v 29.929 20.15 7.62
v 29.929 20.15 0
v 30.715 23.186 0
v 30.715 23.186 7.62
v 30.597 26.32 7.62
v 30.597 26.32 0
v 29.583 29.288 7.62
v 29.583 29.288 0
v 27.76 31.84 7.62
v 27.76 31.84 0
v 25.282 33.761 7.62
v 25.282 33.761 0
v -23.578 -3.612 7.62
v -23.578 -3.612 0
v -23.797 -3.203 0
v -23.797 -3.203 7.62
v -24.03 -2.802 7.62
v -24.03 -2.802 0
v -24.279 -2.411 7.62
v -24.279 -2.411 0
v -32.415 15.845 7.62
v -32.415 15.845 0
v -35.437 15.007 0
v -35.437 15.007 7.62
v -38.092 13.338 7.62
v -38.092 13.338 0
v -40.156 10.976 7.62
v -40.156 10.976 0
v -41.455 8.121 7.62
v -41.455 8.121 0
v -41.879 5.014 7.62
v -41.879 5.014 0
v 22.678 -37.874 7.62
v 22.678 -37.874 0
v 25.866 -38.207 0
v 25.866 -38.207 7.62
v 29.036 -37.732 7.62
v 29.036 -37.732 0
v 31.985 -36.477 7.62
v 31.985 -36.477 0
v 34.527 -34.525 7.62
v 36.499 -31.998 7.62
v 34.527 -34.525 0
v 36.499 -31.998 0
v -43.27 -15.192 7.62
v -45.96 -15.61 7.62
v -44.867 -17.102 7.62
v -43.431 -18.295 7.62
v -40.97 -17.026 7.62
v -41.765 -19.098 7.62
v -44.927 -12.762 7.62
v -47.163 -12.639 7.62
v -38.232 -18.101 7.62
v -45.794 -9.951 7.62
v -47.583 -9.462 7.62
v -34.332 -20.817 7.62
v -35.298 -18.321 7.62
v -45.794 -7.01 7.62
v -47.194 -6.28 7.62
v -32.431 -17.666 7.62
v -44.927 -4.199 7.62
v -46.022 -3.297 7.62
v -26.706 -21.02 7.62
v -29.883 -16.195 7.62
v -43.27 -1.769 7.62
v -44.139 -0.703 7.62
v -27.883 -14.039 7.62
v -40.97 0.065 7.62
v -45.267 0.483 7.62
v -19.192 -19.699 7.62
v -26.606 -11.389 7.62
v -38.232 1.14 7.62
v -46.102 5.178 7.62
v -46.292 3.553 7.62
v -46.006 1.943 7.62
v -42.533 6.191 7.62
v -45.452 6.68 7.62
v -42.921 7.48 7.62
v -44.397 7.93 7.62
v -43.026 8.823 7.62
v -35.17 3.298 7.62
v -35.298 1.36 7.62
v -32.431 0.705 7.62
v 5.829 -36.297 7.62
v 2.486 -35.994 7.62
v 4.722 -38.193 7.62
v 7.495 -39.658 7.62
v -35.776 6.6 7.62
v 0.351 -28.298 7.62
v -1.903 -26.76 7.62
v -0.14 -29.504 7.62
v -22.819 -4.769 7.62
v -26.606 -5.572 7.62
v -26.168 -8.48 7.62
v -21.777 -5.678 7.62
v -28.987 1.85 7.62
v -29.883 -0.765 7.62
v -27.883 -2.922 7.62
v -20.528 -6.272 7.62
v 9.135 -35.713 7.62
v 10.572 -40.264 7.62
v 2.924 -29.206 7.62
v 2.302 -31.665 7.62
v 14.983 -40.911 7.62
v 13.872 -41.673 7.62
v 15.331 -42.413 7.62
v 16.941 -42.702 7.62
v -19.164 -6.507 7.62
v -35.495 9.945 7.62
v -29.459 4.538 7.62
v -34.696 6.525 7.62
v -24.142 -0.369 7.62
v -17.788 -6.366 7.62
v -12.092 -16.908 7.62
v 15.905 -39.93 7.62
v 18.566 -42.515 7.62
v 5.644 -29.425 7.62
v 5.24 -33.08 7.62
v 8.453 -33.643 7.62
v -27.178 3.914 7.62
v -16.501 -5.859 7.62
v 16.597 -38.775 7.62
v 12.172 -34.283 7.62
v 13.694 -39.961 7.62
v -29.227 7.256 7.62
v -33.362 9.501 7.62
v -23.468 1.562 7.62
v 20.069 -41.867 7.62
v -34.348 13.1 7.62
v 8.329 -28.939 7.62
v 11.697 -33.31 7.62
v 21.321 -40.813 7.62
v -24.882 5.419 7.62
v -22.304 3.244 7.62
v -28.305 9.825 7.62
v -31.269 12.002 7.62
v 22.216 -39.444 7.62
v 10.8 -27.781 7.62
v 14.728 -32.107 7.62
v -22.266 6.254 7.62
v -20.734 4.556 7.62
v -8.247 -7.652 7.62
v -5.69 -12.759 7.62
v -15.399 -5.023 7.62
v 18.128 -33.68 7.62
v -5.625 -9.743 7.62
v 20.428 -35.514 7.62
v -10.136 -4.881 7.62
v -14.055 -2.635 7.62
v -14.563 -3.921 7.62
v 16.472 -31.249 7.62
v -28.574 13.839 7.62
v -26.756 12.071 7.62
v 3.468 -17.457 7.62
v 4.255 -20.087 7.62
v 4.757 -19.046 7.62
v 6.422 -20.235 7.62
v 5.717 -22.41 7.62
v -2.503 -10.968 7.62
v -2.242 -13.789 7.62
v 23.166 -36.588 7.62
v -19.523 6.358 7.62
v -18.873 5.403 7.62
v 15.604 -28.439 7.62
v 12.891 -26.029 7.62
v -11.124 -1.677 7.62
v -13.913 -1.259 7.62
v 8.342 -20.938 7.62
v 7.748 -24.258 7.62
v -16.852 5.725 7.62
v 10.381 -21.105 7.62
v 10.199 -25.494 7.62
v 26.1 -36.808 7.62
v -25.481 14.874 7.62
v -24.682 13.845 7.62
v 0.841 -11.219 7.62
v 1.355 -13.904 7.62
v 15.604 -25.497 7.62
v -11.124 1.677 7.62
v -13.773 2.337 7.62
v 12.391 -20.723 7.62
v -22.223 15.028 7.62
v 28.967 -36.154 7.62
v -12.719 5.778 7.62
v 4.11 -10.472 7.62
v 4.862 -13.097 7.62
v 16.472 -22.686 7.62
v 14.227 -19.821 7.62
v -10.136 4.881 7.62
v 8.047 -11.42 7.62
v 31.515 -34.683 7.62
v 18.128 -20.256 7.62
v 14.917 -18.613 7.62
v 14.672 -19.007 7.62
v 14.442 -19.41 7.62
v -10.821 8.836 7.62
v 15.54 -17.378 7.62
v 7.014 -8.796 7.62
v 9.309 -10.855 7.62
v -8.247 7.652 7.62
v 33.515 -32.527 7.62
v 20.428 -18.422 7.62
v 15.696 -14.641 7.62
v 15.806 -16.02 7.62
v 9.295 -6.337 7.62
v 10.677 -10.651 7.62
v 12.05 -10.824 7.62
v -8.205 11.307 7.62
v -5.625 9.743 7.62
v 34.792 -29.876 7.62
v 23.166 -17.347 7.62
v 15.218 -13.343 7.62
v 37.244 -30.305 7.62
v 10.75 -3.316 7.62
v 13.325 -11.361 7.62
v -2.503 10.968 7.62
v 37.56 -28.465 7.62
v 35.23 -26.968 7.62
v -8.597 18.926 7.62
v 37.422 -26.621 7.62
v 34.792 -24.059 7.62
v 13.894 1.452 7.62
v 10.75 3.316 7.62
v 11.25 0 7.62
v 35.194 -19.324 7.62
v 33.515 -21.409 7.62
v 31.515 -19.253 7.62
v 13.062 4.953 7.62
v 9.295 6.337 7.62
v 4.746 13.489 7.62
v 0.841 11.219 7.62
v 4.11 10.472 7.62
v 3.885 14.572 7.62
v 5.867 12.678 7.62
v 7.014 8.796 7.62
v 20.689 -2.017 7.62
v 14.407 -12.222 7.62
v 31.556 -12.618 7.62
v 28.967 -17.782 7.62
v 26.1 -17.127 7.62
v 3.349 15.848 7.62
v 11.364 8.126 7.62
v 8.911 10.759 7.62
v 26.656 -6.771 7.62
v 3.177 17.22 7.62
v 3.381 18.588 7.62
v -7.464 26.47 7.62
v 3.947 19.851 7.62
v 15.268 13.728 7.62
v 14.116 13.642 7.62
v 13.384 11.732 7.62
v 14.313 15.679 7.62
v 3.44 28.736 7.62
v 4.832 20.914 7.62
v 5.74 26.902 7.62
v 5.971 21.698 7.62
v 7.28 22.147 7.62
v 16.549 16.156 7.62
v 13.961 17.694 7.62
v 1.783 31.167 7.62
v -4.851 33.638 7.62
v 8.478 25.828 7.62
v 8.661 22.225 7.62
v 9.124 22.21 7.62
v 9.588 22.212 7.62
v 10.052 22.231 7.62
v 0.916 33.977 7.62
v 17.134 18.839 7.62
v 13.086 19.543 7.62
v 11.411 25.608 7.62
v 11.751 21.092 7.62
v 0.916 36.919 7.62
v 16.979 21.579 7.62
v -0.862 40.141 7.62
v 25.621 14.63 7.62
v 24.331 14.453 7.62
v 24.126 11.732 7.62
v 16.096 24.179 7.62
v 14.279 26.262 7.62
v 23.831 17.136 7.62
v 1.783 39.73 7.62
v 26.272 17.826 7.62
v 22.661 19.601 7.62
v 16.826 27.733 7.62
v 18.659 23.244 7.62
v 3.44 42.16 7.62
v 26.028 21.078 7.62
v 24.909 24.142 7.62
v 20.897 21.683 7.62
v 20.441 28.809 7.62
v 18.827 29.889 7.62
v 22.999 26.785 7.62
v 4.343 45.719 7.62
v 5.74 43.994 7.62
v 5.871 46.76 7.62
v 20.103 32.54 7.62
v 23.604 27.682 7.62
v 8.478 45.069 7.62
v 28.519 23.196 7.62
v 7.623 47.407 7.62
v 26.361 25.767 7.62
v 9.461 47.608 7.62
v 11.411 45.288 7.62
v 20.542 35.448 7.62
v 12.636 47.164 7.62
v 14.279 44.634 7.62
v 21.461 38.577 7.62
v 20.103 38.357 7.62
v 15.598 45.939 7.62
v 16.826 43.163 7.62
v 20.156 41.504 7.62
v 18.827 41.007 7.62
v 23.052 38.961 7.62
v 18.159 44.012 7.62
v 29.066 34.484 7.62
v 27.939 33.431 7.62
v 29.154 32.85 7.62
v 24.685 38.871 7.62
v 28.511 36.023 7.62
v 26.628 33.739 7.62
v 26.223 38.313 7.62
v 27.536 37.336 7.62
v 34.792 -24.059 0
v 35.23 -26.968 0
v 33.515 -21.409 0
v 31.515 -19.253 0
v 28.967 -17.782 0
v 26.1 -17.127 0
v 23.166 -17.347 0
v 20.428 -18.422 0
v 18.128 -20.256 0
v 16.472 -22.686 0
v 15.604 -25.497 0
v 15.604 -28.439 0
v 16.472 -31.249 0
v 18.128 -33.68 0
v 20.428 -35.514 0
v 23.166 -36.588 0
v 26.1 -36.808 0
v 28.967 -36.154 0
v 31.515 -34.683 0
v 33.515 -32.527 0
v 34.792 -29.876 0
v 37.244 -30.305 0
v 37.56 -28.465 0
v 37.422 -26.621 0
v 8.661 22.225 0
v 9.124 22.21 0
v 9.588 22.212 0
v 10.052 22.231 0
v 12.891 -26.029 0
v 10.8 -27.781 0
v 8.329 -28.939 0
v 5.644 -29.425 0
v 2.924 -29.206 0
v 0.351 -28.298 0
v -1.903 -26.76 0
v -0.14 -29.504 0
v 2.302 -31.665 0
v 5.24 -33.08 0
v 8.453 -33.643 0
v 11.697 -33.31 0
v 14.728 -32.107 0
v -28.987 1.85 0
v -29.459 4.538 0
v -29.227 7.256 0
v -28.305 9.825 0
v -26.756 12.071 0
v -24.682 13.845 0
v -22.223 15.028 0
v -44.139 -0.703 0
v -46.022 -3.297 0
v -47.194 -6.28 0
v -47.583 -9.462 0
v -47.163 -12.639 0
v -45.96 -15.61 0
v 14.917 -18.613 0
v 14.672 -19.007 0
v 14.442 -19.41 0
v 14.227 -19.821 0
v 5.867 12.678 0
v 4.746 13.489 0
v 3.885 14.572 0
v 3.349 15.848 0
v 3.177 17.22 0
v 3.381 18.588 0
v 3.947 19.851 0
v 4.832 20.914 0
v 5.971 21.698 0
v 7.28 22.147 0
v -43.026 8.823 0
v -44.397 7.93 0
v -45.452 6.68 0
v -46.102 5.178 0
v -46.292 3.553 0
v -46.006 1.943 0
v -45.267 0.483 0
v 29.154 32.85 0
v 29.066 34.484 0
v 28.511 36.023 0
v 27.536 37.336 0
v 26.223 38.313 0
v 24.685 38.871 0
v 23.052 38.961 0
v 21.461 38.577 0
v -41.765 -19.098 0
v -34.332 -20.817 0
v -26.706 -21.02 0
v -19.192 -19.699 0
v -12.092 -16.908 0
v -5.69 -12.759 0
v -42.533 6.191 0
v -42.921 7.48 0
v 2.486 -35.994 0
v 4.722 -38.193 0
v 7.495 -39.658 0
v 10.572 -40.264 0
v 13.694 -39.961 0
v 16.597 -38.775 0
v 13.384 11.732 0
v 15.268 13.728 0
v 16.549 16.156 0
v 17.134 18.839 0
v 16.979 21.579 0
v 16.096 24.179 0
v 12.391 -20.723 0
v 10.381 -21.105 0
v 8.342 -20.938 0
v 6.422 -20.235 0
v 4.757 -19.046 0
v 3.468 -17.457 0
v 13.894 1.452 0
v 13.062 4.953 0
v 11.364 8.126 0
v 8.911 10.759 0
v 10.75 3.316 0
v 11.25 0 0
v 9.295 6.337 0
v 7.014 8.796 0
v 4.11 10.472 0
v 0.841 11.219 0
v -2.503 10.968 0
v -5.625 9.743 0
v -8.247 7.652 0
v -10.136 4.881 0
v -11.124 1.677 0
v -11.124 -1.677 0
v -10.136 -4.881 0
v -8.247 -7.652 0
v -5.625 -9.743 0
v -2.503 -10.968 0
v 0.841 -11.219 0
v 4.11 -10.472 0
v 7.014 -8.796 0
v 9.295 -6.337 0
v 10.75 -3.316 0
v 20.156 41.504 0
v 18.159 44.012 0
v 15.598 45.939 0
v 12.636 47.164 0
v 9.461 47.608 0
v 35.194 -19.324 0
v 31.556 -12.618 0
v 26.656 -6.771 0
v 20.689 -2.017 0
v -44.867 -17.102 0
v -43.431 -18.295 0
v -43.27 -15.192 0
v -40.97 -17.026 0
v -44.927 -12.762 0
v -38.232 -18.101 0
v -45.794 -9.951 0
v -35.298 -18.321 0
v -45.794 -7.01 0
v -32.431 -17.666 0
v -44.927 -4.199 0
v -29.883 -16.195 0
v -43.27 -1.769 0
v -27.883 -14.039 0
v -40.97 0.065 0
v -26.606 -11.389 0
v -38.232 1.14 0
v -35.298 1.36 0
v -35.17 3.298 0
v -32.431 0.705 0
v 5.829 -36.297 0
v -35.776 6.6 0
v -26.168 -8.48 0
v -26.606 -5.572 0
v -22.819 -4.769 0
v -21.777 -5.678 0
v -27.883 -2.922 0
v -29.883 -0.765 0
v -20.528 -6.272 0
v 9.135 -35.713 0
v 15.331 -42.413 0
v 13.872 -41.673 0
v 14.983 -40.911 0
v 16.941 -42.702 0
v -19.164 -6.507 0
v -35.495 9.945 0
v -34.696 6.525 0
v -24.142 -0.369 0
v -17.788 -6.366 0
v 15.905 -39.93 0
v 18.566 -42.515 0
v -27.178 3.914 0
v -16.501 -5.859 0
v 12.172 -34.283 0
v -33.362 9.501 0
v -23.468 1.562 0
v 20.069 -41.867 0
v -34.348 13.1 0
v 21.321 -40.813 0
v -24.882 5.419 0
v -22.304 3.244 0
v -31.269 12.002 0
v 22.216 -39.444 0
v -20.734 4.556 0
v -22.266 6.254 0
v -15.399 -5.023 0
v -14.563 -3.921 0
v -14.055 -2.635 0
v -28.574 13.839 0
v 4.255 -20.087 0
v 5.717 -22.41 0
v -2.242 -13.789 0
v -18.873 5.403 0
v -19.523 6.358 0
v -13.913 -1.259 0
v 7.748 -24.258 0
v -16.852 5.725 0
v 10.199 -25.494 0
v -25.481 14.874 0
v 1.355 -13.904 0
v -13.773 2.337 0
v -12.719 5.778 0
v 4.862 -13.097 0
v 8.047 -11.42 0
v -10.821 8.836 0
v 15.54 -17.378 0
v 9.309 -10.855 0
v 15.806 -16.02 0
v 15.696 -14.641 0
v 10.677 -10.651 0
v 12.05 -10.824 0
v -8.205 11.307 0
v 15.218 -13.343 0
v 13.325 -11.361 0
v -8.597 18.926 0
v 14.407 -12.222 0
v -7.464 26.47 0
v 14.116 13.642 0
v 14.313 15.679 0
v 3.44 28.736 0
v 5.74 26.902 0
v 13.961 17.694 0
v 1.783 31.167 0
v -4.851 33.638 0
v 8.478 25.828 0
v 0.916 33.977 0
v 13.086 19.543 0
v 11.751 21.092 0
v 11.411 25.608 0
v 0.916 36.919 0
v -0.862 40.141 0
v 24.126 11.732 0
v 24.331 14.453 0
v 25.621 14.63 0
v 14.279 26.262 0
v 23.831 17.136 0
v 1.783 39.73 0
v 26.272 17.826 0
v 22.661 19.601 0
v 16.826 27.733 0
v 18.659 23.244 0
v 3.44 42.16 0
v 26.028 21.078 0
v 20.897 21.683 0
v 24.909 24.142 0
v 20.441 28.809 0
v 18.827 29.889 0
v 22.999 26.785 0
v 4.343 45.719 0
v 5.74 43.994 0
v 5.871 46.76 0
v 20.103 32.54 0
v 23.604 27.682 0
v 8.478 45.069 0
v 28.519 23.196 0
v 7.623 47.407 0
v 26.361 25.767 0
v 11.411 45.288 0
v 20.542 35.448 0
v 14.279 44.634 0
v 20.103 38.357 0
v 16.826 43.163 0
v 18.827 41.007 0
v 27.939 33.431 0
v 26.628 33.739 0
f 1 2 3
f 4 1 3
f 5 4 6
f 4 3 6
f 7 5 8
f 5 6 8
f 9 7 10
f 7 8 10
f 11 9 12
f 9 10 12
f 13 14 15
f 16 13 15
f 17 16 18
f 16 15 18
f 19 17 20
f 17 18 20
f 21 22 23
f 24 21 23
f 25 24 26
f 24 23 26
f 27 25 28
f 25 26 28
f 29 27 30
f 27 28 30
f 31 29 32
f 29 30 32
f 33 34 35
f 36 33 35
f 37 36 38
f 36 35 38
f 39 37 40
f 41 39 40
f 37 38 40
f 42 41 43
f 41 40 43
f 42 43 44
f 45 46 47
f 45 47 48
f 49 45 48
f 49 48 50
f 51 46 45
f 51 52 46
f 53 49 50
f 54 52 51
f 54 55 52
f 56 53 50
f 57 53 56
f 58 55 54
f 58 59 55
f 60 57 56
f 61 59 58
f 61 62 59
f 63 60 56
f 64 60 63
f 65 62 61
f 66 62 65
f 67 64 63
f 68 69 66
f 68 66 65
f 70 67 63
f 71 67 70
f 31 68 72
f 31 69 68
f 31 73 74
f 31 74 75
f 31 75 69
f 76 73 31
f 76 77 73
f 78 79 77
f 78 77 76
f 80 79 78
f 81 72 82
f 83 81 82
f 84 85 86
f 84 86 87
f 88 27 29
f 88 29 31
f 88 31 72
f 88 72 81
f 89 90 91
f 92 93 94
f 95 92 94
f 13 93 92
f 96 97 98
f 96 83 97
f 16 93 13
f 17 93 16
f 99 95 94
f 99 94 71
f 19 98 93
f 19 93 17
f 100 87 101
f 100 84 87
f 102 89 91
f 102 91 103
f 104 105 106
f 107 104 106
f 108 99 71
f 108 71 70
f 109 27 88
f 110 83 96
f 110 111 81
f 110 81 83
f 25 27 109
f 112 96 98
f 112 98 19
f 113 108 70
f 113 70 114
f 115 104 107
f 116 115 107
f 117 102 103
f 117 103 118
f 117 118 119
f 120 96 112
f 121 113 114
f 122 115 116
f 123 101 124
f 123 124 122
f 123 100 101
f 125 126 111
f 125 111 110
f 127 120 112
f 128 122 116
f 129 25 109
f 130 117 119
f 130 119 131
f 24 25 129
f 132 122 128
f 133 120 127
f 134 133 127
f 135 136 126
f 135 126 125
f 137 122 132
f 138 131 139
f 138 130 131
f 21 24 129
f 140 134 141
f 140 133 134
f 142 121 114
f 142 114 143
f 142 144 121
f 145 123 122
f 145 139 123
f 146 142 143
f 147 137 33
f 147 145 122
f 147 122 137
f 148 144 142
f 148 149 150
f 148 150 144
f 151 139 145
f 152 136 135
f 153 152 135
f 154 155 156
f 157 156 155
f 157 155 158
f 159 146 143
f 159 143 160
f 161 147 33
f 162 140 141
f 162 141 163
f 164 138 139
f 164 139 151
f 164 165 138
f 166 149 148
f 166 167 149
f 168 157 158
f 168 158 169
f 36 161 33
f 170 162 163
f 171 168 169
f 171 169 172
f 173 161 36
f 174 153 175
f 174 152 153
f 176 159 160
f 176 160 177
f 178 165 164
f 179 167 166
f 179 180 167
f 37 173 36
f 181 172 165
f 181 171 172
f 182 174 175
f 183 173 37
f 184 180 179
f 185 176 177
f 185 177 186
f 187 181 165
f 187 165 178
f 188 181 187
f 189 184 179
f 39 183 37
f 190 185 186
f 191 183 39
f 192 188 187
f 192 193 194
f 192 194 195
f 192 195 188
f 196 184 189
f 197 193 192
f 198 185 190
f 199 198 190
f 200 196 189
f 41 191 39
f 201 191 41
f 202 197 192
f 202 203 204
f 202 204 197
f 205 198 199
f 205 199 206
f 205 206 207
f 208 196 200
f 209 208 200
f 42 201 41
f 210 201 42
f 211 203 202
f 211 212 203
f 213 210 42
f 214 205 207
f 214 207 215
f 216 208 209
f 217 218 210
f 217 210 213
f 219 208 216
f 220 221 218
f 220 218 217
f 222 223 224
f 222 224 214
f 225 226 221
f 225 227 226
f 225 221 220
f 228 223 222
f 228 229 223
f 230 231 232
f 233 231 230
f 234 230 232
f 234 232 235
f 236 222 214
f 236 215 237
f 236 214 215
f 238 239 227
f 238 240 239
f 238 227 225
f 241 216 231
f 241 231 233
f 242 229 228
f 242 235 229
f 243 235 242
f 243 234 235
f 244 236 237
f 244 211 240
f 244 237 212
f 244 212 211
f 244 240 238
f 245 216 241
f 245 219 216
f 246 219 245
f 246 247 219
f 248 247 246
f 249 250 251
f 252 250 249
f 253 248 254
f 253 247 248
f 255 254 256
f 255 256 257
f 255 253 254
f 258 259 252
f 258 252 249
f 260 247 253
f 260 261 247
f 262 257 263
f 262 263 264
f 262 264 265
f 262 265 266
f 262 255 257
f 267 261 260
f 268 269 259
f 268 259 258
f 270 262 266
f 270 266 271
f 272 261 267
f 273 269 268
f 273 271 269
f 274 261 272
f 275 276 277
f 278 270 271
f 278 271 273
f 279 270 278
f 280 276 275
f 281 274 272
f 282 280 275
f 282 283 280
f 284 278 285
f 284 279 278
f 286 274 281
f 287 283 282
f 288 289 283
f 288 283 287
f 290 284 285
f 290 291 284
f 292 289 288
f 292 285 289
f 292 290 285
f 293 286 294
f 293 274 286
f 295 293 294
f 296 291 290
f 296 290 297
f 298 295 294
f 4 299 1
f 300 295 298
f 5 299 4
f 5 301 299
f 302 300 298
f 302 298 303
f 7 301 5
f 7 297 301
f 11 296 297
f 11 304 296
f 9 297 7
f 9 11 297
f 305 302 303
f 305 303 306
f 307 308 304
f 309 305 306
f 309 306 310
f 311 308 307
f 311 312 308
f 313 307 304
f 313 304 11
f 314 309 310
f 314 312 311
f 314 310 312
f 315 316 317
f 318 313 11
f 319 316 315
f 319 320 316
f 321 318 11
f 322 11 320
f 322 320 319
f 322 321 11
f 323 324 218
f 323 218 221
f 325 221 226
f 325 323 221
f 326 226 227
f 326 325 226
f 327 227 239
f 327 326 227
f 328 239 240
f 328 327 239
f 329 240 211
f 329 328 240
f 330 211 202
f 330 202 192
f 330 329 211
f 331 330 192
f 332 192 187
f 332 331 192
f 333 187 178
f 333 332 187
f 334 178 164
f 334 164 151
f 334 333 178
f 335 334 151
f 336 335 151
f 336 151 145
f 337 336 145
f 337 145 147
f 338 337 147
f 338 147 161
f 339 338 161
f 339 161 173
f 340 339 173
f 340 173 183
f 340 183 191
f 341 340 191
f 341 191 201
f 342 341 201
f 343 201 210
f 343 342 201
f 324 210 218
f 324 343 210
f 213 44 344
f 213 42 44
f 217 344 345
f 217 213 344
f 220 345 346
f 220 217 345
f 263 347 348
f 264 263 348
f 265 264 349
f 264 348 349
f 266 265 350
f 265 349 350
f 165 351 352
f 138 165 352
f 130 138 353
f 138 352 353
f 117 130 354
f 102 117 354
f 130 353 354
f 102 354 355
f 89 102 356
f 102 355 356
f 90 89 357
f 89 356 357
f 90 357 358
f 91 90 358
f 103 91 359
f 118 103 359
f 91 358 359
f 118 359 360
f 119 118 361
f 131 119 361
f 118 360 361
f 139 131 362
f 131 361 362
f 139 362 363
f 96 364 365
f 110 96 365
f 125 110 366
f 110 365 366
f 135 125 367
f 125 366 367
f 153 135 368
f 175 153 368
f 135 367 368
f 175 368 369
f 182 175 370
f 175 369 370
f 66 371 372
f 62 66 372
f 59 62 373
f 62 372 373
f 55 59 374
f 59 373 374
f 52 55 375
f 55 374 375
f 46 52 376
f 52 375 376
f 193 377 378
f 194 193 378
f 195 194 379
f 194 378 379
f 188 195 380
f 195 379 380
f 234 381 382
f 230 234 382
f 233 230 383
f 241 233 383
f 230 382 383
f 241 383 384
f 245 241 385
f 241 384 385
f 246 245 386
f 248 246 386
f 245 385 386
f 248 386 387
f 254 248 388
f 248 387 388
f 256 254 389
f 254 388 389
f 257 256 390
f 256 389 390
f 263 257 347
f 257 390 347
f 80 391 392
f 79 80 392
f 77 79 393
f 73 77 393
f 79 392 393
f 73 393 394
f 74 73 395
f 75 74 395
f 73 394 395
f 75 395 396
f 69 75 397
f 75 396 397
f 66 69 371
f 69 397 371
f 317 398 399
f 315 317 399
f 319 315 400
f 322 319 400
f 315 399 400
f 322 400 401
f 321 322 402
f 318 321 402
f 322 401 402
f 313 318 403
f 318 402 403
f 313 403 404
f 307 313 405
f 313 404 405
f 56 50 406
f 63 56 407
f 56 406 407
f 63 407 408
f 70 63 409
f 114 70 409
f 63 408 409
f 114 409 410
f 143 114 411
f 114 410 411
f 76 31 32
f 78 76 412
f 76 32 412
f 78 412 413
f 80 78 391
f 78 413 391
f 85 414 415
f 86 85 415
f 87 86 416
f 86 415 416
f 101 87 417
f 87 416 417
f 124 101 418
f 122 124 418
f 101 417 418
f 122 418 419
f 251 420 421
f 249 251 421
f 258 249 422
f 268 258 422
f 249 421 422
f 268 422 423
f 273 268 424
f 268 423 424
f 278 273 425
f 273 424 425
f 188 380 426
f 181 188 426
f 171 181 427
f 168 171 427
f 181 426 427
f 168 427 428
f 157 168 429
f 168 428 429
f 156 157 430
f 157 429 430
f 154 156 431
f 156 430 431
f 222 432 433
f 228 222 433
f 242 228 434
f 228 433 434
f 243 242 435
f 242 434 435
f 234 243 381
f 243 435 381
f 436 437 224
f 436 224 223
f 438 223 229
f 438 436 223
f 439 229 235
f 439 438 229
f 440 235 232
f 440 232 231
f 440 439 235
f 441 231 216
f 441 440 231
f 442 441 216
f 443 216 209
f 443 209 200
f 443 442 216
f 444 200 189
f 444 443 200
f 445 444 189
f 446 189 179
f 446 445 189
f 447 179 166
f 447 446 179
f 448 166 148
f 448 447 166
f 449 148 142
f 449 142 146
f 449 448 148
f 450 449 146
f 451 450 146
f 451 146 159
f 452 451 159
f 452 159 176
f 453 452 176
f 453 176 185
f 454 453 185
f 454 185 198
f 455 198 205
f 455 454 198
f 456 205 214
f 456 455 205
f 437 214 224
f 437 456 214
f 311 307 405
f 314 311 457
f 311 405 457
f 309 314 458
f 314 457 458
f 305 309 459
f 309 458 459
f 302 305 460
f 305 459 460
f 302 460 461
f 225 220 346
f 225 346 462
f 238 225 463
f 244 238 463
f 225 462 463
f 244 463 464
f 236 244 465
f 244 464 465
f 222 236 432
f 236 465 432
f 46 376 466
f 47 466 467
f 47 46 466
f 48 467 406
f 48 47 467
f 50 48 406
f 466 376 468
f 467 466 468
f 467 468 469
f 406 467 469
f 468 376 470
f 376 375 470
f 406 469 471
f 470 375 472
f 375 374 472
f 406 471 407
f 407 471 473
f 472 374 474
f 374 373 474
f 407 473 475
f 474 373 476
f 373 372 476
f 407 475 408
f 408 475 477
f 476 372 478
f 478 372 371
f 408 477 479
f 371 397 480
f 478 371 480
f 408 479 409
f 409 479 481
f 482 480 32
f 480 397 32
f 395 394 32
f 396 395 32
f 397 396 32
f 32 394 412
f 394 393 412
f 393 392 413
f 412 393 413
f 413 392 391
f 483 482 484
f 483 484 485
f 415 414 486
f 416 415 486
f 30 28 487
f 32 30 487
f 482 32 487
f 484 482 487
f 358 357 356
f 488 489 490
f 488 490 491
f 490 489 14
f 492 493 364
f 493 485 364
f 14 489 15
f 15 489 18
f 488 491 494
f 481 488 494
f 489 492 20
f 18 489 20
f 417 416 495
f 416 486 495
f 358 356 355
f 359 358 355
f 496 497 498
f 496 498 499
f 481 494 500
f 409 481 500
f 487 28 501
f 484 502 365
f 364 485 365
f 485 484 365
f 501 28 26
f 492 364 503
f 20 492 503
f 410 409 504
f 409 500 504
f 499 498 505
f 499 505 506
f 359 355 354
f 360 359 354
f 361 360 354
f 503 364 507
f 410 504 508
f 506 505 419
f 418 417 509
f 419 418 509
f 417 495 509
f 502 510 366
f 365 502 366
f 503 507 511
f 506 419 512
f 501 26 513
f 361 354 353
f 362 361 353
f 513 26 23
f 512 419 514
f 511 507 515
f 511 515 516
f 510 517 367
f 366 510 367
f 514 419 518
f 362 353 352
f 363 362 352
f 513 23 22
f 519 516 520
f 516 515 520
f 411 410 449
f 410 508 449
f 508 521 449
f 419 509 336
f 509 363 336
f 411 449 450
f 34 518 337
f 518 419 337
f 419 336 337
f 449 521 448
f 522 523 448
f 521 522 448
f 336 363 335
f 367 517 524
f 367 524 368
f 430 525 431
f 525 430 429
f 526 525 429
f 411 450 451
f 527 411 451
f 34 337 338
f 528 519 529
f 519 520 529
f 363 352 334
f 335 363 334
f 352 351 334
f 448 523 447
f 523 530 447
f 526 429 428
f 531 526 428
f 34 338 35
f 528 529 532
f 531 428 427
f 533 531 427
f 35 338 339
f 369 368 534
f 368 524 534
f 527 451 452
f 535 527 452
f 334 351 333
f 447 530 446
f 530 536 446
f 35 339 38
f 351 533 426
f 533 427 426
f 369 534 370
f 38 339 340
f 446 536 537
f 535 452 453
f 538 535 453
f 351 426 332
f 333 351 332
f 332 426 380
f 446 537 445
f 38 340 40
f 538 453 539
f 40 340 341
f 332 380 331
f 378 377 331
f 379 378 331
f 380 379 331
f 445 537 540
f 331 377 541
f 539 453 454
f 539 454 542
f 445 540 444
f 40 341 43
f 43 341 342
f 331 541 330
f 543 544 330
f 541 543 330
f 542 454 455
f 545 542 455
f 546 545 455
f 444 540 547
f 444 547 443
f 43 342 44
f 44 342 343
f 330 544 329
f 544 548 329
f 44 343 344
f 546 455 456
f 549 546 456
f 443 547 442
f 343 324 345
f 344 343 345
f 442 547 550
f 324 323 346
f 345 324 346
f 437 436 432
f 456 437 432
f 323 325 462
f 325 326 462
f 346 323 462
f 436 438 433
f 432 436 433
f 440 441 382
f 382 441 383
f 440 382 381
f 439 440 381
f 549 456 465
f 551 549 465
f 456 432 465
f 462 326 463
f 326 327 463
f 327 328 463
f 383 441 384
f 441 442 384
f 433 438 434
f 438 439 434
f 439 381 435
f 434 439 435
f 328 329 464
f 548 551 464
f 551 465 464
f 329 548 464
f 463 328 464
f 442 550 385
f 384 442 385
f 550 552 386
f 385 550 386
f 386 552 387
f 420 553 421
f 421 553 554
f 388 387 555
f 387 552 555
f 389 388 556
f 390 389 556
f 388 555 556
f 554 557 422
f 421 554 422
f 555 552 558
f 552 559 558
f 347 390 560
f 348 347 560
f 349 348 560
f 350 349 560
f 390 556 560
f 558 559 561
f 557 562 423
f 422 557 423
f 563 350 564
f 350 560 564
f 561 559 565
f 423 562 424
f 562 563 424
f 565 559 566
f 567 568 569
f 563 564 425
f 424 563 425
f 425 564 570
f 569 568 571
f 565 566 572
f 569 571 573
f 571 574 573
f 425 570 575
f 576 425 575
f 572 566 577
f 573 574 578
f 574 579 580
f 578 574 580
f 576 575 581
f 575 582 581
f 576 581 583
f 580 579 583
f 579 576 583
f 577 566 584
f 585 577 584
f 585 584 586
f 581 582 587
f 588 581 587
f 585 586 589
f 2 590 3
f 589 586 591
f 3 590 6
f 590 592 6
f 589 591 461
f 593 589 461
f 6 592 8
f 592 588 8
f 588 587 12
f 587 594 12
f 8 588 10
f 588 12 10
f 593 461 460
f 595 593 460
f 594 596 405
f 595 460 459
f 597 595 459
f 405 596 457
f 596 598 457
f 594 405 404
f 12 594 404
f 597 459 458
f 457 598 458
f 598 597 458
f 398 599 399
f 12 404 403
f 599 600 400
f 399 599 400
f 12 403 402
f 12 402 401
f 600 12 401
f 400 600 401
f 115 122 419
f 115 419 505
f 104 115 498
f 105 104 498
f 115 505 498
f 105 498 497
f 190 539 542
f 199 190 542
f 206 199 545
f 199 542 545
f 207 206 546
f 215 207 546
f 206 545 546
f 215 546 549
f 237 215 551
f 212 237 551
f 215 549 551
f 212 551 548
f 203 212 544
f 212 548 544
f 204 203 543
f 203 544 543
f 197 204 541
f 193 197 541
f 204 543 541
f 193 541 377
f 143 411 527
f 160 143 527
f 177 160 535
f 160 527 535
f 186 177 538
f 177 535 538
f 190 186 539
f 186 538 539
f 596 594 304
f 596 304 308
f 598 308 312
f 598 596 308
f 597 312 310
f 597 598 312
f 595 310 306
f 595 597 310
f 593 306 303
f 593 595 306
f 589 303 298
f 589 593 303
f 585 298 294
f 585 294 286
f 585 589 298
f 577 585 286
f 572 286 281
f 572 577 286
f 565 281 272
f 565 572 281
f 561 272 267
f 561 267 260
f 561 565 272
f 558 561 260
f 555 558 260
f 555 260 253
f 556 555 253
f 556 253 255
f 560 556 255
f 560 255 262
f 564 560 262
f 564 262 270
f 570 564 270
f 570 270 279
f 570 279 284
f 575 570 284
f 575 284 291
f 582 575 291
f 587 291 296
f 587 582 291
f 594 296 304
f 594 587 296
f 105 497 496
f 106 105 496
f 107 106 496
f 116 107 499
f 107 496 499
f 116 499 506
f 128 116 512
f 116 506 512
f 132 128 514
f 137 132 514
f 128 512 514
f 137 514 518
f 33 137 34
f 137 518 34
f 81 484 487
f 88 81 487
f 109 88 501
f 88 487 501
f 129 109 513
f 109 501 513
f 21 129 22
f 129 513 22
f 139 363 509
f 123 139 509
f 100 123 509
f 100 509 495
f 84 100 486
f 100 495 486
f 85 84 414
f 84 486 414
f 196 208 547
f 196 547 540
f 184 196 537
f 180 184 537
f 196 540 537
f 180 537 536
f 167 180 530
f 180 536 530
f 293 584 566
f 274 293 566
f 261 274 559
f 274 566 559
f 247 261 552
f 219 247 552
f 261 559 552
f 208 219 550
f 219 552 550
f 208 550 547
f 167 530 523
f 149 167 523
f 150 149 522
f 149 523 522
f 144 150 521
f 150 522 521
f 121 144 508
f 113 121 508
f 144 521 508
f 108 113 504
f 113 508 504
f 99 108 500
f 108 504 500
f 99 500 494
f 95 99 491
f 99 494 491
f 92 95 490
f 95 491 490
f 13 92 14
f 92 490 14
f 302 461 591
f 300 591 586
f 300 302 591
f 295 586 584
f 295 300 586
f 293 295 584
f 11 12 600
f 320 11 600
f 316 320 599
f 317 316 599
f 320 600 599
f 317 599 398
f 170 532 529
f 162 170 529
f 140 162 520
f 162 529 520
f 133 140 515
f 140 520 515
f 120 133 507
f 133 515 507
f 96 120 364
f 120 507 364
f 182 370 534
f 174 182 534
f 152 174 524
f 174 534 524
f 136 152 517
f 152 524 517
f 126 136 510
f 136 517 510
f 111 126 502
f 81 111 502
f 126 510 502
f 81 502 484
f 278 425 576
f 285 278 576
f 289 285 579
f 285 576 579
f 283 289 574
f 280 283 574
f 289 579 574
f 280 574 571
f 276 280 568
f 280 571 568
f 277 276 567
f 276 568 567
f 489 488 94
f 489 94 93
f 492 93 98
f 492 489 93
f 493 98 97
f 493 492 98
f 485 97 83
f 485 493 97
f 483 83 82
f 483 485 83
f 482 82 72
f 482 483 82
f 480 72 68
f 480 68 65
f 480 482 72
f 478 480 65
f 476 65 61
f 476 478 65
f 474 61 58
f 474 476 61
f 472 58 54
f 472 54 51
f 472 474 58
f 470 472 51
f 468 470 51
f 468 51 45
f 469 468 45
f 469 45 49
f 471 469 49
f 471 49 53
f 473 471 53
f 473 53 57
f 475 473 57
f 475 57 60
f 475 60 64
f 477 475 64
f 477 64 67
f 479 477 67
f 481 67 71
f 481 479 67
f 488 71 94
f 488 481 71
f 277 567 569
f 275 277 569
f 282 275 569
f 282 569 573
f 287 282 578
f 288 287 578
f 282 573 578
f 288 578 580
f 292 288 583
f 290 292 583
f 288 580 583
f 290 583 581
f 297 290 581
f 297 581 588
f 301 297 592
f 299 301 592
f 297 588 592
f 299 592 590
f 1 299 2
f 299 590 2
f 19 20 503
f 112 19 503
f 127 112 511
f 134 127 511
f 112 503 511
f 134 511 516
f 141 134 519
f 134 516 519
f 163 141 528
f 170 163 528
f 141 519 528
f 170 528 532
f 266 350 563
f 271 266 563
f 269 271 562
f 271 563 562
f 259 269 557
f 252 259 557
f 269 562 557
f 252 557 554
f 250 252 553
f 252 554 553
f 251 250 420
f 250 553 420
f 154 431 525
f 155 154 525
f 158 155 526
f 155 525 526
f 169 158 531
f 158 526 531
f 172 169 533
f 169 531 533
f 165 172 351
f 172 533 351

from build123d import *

# Parameters (mm, degrees)
F0_R     = 9.8679
F0_R_2   = 11.25
F1_DEPTH = 7.62
F2_R     = 7.62


with BuildPart() as f1:
    # F0 (on Top) → F1 (new body)
    with BuildSketch(Plane.XY):
        with BuildLine():
            ThreePointArc((-43.9675390459, -18.2733148979), (-24.0769783095, -20.7336914411), (-5.6897763655, -12.7588144007))
            ThreePointArc((-5.6897763655, -12.7588144007), (-11.3636627485, -8.1257657448), (-13.9131894177, -1.2585945443))
            ThreePointArc((-13.9131894177, -1.2585945443), (-17.7883649195, -6.3661757884), (-23.5779527058, -3.6120798208))
            ThreePointArc((-23.5779527058, -3.6120798208), (-23.9117664703, -3.0016925054), (-24.27850376, -2.4105004347))
            ThreePointArc((-24.27850376, -2.4105004347), (-26.3622058351, 0.0187882898), (-28.9870638751, 1.8500114644))
            ThreePointArc((-28.9870638751, 1.8500114644), (-31.9863775374, 2.9668711691), (-35.1696654297, 3.2984375125))
            ThreePointArc((-35.1696654297, 3.2984375125), (-36.9929388731, 3.125210966), (-38.772336885, 2.6915334348))
            ThreePointArc((-38.772336885, 2.6915334348), (-40.0568325476, 2.2001090277), (-41.2806580353, 1.5726711973))
            ThreePointArc((-41.2806580353, 1.5726711973), (-42.7921593571, 0.5384095089), (-44.1391793855, -0.7025056892))
            ThreePointArc((-44.1391793855, -0.7025056892), (-47.5826237378, -9.5223858919), (-43.9675390459, -18.2733148979))
        make_face()
        with Locations((-36.0358898416, -8.480387548)):
            Circle(F0_R, mode=Mode.SUBTRACT)
        with BuildLine():
            ThreePointArc((8.0465695573, -11.4198782113), (12.4010377936, -6.4323527299), (13.97, 0))
            ThreePointArc((13.97, 0), (13.9510735733, 0.7269430186), (13.8943455759, 1.4519163259))
            ThreePointArc((13.8943455759, 1.4519163259), (11.3636627485, 8.1257657448), (5.8666198604, 12.6784727555))
            ThreePointArc((5.8666198604, 12.6784727555), (-1.355288186, 13.9041034926), (-8.2045692104, 11.3068980747))
            ThreePointArc((-8.2045692104, 11.3068980747), (-12.7189509344, 5.7783377478), (-13.9131894177, -1.2585945443))
            ThreePointArc((-13.9131894177, -1.2585945443), (-11.3636627485, -8.1257657448), (-5.6897763655, -12.7588144007))
            ThreePointArc((-5.6897763655, -12.7588144007), (1.355288186, -13.9041034926), (8.0465695573, -11.4198782113))
        make_face()
        Circle(F0_R_2, mode=Mode.SUBTRACT)
        with BuildLine():
            ThreePointArc((-43.025617844, 8.8228840299), (-46.2565836802, 4.3728136122), (-44.1391793855, -0.7025056892))
            ThreePointArc((-44.1391793855, -0.7025056892), (-42.7921593571, 0.5384095089), (-41.2806580353, 1.5726711973))
            ThreePointArc((-41.2806580353, 1.5726711973), (-41.7197337386, 3.26892729), (-41.8789534473, 5.0138402649))
            ThreePointArc((-41.8789534473, 5.0138402649), (-42.7619749641, 6.8251340993), (-43.025617844, 8.8228840299))
        make_face()
        with BuildLine():
            ThreePointArc((-32.4148590407, 15.8445106758), (-39.2100586679, 12.2320065578), (-41.8789534473, 5.0138402649))
            ThreePointArc((-41.8789534473, 5.0138402649), (-40.5095024441, 3.6067356872), (-38.772336885, 2.6915334348))
            ThreePointArc((-38.772336885, 2.6915334348), (-36.9929388731, 3.125210966), (-35.1696654297, 3.2984375125))
            ThreePointArc((-35.1696654297, 3.2984375125), (-35.4953325875, 9.945426089), (-32.4148590407, 15.8445106758))
        make_face()
        with BuildLine():
            ThreePointArc((-41.8789534473, 5.0138402649), (-41.7197337386, 3.26892729), (-41.2806580353, 1.5726711973))
            ThreePointArc((-41.2806580353, 1.5726711973), (-40.0568325476, 2.2001090277), (-38.772336885, 2.6915334348))
            ThreePointArc((-38.772336885, 2.6915334348), (-40.5095024441, 3.6067356872), (-41.8789534473, 5.0138402649))
        make_face()
        with BuildLine():
            ThreePointArc((-35.1696654297, 3.2984375125), (-31.9863775374, 2.9668711691), (-28.9870638751, 1.8500114644))
            ThreePointArc((-28.9870638751, 1.8500114644), (-28.3049856869, 9.8245411614), (-22.2233339706, 15.0276043883))
            ThreePointArc((-22.2233339706, 15.0276043883), (-31.268583607, 12.0020163498), (-35.1696654297, 3.2984375125))
        make_face()
        with BuildLine():
            ThreePointArc((-28.9870638751, 1.8500114644), (-26.3622058351, 0.0187882898), (-24.27850376, -2.4105004347))
            ThreePointArc((-24.27850376, -2.4105004347), (-22.3038787795, 3.2440665901), (-16.8522933059, 5.7246890677))
            ThreePointArc((-16.8522933059, 5.7246890677), (-23.6023200247, 5.925256444), (-28.9870638751, 1.8500114644))
        make_face()
        with BuildLine():
            ThreePointArc((-8.2045692104, 11.3068980747), (-1.355288186, 13.9041034926), (5.8666198604, 12.6784727555))
            ThreePointArc((5.8666198604, 12.6784727555), (3.3809125021, 18.5882638063), (8.6608234676, 22.2251459229))
            ThreePointArc((8.6608234676, 22.2251459229), (9.3563412711, 22.2090434653), (10.0516972677, 22.2310512394))
            ThreePointArc((10.0516972677, 22.2310512394), (13.1973740538, 22.8209458081), (16.095688863, 24.1785279647))
            ThreePointArc((16.095688863, 24.1785279647), (18.5625745709, 26.2175799379), (20.4413633934, 28.8086049485))
            ThreePointArc((20.4413633934, 28.8086049485), (21.2029815253, 30.4742193418), (21.7171047722, 32.2320619891))
            ThreePointArc((21.7171047722, 32.2320619891), (21.9337665829, 33.5901800675), (22.0023022263, 34.9637629448))
            ThreePointArc((22.0023022263, 34.9637629448), (21.8623559909, 36.7898923316), (21.4612019196, 38.5769034946))
            ThreePointArc((21.4612019196, 38.5769034946), (15.5446837819, 45.9689538816), (6.15861461, 47.2136632046))
            ThreePointArc((6.15861461, 47.2136632046), (-5.9174143474, 31.218120583), (-8.2045692104, 11.3068980747))
        make_face()
        with Locations((10.6737138703, 35.4481898248)):
            Circle(F0_R, mode=Mode.SUBTRACT)
        with BuildLine():
            ThreePointArc((13.8943455759, 1.4519163259), (13.9510735733, 0.7269430186), (13.97, 0))
            ThreePointArc((13.97, 0), (12.4010377936, -6.4323527299), (8.0465695573, -11.4198782113))
            ThreePointArc((8.0465695573, -11.4198782113), (14.4074524174, -12.2220880179), (14.9171292382, -18.6130661021))
            ThreePointArc((14.9171292382, -18.6130661021), (14.5554251992, -19.2073509599), (14.2268064923, -19.8205508047))
            ThreePointArc((14.2268064923, -19.8205508047), (13.1648317813, -22.8397340979), (12.891375012, -26.0285394291))
            ThreePointArc((12.891375012, -26.0285394291), (13.4238029666, -29.184451107), (14.7283020363, -32.1070424609))
            ThreePointArc((14.7283020363, -32.1070424609), (15.7899573478, -33.5994303078), (17.0552321128, -34.9235954239))
            ThreePointArc((17.0552321128, -34.9235954239), (18.1230659647, -35.7902890953), (19.278355809, -36.5364341421))
            ThreePointArc((19.278355809, -36.5364341421), (20.9298033662, -37.3283018405), (22.6779774659, -37.8743978054))
            ThreePointArc((22.6779774659, -37.8743978054), (32.0379399559, -36.4465679897), (37.8089244359, -28.9403483066))
            ThreePointArc((37.8089244359, -28.9403483066), (29.994392657, -10.4844291419), (13.8943455759, 1.4519163259))
        make_face()
        with Locations((25.3621759713, -26.9678022769)):
            Circle(F0_R, mode=Mode.SUBTRACT)
        with BuildLine():
            ThreePointArc((29.1536506265, 32.8498360514), (26.9152595143, 37.8729697533), (21.4612019196, 38.5769034946))
            ThreePointArc((21.4612019196, 38.5769034946), (21.8623559909, 36.7898923316), (22.0023022263, 34.9637629448))
            ThreePointArc((22.0023022263, 34.9637629448), (23.6908409456, 34.4958856118), (25.2815897635, 33.7613174369))
            ThreePointArc((25.2815897635, 33.7613174369), (27.2917269962, 33.6203895852), (29.1536506265, 32.8498360514))
        make_face()
        with BuildLine():
            ThreePointArc((21.7171047722, 32.2320619891), (21.2029815253, 30.4742193418), (20.4413633934, 28.8086049485))
            ThreePointArc((20.4413633934, 28.8086049485), (26.3606579383, 25.7671466921), (29.9291782762, 20.1498360514))
            ThreePointArc((29.9291782762, 20.1498360514), (30.1982577523, 27.8409036114), (25.2815897635, 33.7613174369))
            ThreePointArc((25.2815897635, 33.7613174369), (23.3782759519, 33.2788903677), (21.7171047722, 32.2320619891))
        make_face()
        with BuildLine():
            ThreePointArc((20.4413633934, 28.8086049485), (18.5625745709, 26.2175799379), (16.095688863, 24.1785279647))
            ThreePointArc((16.095688863, 24.1785279647), (22.6607950698, 19.6005660779), (24.1259541436, 11.7321695811))
            ThreePointArc((24.1259541436, 11.7321695811), (26.028342859, 21.0783795691), (20.4413633934, 28.8086049485))
        make_face()
        with BuildLine():
            ThreePointArc((16.095688863, 24.1785279647), (13.1973740538, 22.8209458081), (10.0516972677, 22.2310512394))
            ThreePointArc((10.0516972677, 22.2310512394), (13.9613834684, 17.6936923309), (13.3838728144, 11.7321695811))
            ThreePointArc((13.3838728144, 11.7321695811), (16.9325826168, 17.4775805077), (16.095688863, 24.1785279647))
        make_face()
        with BuildLine():
            ThreePointArc((25.2815897635, 33.7613174369), (23.6908409456, 34.4958856118), (22.0023022263, 34.9637629448))
            ThreePointArc((22.0023022263, 34.9637629448), (21.9337665829, 33.5901800675), (21.7171047722, 32.2320619891))
            ThreePointArc((21.7171047722, 32.2320619891), (23.3782759519, 33.2788903677), (25.2815897635, 33.7613174369))
        make_face()
        with BuildLine():
            ThreePointArc((12.891375012, -26.0285394291), (13.1648317813, -22.8397340979), (14.2268064923, -19.8205508047))
            ThreePointArc((14.2268064923, -19.8205508047), (8.3424953112, -20.937758921), (3.4684204916, -17.4568586488))
            ThreePointArc((3.4684204916, -17.4568586488), (6.6697374079, -23.4028369517), (12.891375012, -26.0285394291))
        make_face()
        with BuildLine():
            ThreePointArc((14.7283020363, -32.1070424609), (13.4238029666, -29.184451107), (12.891375012, -26.0285394291))
            ThreePointArc((12.891375012, -26.0285394291), (5.6441906172, -29.4251072393), (-1.902620173, -26.7597739695))
            ThreePointArc((-1.902620173, -26.7597739695), (5.240240748, -33.0803959189), (14.7283020363, -32.1070424609))
        make_face()
        with BuildLine():
            ThreePointArc((13.8719672174, -41.6727200814), (19.341324166, -42.2457833654), (22.6779774659, -37.8743978054))
            ThreePointArc((22.6779774659, -37.8743978054), (20.9298033662, -37.3283018405), (19.278355809, -36.5364341421))
            ThreePointArc((19.278355809, -36.5364341421), (18.028892793, -37.7648129018), (16.5973636838, -38.7751577017))
            ThreePointArc((16.5973636838, -38.7751577017), (15.4702479678, -40.4455236845), (13.8719672174, -41.6727200814))
        make_face()
        with BuildLine():
            ThreePointArc((2.4856807646, -35.9943467273), (9.0118009156, -40.0729101692), (16.5973636838, -38.7751577017))
            ThreePointArc((16.5973636838, -38.7751577017), (17.1312264922, -36.8856260549), (17.0552321128, -34.9235954239))
            ThreePointArc((17.0552321128, -34.9235954239), (15.7899573478, -33.5994303078), (14.7283020363, -32.1070424609))
            ThreePointArc((14.7283020363, -32.1070424609), (9.1346746492, -35.7125727811), (2.4856807646, -35.9943467273))
        make_face()
        with BuildLine():
            ThreePointArc((16.5973636838, -38.7751577017), (18.028892793, -37.7648129018), (19.278355809, -36.5364341421))
            ThreePointArc((19.278355809, -36.5364341421), (18.1230659647, -35.7902890953), (17.0552321128, -34.9235954239))
            ThreePointArc((17.0552321128, -34.9235954239), (17.1312264922, -36.8856260549), (16.5973636838, -38.7751577017))
        make_face()
    extrude(amount=F1_DEPTH)

    # F2
    f2_edges = [f1.edges().sort_by_distance(p)[0] for p in [
        (37.808924, -28.940348, 3.81),
        (6.158615, 47.213663, 3.81),
        (-43.967539, -18.273315, 3.81),
    ]]
    fillet(f2_edges, radius=F2_R)


solid = f1.part
